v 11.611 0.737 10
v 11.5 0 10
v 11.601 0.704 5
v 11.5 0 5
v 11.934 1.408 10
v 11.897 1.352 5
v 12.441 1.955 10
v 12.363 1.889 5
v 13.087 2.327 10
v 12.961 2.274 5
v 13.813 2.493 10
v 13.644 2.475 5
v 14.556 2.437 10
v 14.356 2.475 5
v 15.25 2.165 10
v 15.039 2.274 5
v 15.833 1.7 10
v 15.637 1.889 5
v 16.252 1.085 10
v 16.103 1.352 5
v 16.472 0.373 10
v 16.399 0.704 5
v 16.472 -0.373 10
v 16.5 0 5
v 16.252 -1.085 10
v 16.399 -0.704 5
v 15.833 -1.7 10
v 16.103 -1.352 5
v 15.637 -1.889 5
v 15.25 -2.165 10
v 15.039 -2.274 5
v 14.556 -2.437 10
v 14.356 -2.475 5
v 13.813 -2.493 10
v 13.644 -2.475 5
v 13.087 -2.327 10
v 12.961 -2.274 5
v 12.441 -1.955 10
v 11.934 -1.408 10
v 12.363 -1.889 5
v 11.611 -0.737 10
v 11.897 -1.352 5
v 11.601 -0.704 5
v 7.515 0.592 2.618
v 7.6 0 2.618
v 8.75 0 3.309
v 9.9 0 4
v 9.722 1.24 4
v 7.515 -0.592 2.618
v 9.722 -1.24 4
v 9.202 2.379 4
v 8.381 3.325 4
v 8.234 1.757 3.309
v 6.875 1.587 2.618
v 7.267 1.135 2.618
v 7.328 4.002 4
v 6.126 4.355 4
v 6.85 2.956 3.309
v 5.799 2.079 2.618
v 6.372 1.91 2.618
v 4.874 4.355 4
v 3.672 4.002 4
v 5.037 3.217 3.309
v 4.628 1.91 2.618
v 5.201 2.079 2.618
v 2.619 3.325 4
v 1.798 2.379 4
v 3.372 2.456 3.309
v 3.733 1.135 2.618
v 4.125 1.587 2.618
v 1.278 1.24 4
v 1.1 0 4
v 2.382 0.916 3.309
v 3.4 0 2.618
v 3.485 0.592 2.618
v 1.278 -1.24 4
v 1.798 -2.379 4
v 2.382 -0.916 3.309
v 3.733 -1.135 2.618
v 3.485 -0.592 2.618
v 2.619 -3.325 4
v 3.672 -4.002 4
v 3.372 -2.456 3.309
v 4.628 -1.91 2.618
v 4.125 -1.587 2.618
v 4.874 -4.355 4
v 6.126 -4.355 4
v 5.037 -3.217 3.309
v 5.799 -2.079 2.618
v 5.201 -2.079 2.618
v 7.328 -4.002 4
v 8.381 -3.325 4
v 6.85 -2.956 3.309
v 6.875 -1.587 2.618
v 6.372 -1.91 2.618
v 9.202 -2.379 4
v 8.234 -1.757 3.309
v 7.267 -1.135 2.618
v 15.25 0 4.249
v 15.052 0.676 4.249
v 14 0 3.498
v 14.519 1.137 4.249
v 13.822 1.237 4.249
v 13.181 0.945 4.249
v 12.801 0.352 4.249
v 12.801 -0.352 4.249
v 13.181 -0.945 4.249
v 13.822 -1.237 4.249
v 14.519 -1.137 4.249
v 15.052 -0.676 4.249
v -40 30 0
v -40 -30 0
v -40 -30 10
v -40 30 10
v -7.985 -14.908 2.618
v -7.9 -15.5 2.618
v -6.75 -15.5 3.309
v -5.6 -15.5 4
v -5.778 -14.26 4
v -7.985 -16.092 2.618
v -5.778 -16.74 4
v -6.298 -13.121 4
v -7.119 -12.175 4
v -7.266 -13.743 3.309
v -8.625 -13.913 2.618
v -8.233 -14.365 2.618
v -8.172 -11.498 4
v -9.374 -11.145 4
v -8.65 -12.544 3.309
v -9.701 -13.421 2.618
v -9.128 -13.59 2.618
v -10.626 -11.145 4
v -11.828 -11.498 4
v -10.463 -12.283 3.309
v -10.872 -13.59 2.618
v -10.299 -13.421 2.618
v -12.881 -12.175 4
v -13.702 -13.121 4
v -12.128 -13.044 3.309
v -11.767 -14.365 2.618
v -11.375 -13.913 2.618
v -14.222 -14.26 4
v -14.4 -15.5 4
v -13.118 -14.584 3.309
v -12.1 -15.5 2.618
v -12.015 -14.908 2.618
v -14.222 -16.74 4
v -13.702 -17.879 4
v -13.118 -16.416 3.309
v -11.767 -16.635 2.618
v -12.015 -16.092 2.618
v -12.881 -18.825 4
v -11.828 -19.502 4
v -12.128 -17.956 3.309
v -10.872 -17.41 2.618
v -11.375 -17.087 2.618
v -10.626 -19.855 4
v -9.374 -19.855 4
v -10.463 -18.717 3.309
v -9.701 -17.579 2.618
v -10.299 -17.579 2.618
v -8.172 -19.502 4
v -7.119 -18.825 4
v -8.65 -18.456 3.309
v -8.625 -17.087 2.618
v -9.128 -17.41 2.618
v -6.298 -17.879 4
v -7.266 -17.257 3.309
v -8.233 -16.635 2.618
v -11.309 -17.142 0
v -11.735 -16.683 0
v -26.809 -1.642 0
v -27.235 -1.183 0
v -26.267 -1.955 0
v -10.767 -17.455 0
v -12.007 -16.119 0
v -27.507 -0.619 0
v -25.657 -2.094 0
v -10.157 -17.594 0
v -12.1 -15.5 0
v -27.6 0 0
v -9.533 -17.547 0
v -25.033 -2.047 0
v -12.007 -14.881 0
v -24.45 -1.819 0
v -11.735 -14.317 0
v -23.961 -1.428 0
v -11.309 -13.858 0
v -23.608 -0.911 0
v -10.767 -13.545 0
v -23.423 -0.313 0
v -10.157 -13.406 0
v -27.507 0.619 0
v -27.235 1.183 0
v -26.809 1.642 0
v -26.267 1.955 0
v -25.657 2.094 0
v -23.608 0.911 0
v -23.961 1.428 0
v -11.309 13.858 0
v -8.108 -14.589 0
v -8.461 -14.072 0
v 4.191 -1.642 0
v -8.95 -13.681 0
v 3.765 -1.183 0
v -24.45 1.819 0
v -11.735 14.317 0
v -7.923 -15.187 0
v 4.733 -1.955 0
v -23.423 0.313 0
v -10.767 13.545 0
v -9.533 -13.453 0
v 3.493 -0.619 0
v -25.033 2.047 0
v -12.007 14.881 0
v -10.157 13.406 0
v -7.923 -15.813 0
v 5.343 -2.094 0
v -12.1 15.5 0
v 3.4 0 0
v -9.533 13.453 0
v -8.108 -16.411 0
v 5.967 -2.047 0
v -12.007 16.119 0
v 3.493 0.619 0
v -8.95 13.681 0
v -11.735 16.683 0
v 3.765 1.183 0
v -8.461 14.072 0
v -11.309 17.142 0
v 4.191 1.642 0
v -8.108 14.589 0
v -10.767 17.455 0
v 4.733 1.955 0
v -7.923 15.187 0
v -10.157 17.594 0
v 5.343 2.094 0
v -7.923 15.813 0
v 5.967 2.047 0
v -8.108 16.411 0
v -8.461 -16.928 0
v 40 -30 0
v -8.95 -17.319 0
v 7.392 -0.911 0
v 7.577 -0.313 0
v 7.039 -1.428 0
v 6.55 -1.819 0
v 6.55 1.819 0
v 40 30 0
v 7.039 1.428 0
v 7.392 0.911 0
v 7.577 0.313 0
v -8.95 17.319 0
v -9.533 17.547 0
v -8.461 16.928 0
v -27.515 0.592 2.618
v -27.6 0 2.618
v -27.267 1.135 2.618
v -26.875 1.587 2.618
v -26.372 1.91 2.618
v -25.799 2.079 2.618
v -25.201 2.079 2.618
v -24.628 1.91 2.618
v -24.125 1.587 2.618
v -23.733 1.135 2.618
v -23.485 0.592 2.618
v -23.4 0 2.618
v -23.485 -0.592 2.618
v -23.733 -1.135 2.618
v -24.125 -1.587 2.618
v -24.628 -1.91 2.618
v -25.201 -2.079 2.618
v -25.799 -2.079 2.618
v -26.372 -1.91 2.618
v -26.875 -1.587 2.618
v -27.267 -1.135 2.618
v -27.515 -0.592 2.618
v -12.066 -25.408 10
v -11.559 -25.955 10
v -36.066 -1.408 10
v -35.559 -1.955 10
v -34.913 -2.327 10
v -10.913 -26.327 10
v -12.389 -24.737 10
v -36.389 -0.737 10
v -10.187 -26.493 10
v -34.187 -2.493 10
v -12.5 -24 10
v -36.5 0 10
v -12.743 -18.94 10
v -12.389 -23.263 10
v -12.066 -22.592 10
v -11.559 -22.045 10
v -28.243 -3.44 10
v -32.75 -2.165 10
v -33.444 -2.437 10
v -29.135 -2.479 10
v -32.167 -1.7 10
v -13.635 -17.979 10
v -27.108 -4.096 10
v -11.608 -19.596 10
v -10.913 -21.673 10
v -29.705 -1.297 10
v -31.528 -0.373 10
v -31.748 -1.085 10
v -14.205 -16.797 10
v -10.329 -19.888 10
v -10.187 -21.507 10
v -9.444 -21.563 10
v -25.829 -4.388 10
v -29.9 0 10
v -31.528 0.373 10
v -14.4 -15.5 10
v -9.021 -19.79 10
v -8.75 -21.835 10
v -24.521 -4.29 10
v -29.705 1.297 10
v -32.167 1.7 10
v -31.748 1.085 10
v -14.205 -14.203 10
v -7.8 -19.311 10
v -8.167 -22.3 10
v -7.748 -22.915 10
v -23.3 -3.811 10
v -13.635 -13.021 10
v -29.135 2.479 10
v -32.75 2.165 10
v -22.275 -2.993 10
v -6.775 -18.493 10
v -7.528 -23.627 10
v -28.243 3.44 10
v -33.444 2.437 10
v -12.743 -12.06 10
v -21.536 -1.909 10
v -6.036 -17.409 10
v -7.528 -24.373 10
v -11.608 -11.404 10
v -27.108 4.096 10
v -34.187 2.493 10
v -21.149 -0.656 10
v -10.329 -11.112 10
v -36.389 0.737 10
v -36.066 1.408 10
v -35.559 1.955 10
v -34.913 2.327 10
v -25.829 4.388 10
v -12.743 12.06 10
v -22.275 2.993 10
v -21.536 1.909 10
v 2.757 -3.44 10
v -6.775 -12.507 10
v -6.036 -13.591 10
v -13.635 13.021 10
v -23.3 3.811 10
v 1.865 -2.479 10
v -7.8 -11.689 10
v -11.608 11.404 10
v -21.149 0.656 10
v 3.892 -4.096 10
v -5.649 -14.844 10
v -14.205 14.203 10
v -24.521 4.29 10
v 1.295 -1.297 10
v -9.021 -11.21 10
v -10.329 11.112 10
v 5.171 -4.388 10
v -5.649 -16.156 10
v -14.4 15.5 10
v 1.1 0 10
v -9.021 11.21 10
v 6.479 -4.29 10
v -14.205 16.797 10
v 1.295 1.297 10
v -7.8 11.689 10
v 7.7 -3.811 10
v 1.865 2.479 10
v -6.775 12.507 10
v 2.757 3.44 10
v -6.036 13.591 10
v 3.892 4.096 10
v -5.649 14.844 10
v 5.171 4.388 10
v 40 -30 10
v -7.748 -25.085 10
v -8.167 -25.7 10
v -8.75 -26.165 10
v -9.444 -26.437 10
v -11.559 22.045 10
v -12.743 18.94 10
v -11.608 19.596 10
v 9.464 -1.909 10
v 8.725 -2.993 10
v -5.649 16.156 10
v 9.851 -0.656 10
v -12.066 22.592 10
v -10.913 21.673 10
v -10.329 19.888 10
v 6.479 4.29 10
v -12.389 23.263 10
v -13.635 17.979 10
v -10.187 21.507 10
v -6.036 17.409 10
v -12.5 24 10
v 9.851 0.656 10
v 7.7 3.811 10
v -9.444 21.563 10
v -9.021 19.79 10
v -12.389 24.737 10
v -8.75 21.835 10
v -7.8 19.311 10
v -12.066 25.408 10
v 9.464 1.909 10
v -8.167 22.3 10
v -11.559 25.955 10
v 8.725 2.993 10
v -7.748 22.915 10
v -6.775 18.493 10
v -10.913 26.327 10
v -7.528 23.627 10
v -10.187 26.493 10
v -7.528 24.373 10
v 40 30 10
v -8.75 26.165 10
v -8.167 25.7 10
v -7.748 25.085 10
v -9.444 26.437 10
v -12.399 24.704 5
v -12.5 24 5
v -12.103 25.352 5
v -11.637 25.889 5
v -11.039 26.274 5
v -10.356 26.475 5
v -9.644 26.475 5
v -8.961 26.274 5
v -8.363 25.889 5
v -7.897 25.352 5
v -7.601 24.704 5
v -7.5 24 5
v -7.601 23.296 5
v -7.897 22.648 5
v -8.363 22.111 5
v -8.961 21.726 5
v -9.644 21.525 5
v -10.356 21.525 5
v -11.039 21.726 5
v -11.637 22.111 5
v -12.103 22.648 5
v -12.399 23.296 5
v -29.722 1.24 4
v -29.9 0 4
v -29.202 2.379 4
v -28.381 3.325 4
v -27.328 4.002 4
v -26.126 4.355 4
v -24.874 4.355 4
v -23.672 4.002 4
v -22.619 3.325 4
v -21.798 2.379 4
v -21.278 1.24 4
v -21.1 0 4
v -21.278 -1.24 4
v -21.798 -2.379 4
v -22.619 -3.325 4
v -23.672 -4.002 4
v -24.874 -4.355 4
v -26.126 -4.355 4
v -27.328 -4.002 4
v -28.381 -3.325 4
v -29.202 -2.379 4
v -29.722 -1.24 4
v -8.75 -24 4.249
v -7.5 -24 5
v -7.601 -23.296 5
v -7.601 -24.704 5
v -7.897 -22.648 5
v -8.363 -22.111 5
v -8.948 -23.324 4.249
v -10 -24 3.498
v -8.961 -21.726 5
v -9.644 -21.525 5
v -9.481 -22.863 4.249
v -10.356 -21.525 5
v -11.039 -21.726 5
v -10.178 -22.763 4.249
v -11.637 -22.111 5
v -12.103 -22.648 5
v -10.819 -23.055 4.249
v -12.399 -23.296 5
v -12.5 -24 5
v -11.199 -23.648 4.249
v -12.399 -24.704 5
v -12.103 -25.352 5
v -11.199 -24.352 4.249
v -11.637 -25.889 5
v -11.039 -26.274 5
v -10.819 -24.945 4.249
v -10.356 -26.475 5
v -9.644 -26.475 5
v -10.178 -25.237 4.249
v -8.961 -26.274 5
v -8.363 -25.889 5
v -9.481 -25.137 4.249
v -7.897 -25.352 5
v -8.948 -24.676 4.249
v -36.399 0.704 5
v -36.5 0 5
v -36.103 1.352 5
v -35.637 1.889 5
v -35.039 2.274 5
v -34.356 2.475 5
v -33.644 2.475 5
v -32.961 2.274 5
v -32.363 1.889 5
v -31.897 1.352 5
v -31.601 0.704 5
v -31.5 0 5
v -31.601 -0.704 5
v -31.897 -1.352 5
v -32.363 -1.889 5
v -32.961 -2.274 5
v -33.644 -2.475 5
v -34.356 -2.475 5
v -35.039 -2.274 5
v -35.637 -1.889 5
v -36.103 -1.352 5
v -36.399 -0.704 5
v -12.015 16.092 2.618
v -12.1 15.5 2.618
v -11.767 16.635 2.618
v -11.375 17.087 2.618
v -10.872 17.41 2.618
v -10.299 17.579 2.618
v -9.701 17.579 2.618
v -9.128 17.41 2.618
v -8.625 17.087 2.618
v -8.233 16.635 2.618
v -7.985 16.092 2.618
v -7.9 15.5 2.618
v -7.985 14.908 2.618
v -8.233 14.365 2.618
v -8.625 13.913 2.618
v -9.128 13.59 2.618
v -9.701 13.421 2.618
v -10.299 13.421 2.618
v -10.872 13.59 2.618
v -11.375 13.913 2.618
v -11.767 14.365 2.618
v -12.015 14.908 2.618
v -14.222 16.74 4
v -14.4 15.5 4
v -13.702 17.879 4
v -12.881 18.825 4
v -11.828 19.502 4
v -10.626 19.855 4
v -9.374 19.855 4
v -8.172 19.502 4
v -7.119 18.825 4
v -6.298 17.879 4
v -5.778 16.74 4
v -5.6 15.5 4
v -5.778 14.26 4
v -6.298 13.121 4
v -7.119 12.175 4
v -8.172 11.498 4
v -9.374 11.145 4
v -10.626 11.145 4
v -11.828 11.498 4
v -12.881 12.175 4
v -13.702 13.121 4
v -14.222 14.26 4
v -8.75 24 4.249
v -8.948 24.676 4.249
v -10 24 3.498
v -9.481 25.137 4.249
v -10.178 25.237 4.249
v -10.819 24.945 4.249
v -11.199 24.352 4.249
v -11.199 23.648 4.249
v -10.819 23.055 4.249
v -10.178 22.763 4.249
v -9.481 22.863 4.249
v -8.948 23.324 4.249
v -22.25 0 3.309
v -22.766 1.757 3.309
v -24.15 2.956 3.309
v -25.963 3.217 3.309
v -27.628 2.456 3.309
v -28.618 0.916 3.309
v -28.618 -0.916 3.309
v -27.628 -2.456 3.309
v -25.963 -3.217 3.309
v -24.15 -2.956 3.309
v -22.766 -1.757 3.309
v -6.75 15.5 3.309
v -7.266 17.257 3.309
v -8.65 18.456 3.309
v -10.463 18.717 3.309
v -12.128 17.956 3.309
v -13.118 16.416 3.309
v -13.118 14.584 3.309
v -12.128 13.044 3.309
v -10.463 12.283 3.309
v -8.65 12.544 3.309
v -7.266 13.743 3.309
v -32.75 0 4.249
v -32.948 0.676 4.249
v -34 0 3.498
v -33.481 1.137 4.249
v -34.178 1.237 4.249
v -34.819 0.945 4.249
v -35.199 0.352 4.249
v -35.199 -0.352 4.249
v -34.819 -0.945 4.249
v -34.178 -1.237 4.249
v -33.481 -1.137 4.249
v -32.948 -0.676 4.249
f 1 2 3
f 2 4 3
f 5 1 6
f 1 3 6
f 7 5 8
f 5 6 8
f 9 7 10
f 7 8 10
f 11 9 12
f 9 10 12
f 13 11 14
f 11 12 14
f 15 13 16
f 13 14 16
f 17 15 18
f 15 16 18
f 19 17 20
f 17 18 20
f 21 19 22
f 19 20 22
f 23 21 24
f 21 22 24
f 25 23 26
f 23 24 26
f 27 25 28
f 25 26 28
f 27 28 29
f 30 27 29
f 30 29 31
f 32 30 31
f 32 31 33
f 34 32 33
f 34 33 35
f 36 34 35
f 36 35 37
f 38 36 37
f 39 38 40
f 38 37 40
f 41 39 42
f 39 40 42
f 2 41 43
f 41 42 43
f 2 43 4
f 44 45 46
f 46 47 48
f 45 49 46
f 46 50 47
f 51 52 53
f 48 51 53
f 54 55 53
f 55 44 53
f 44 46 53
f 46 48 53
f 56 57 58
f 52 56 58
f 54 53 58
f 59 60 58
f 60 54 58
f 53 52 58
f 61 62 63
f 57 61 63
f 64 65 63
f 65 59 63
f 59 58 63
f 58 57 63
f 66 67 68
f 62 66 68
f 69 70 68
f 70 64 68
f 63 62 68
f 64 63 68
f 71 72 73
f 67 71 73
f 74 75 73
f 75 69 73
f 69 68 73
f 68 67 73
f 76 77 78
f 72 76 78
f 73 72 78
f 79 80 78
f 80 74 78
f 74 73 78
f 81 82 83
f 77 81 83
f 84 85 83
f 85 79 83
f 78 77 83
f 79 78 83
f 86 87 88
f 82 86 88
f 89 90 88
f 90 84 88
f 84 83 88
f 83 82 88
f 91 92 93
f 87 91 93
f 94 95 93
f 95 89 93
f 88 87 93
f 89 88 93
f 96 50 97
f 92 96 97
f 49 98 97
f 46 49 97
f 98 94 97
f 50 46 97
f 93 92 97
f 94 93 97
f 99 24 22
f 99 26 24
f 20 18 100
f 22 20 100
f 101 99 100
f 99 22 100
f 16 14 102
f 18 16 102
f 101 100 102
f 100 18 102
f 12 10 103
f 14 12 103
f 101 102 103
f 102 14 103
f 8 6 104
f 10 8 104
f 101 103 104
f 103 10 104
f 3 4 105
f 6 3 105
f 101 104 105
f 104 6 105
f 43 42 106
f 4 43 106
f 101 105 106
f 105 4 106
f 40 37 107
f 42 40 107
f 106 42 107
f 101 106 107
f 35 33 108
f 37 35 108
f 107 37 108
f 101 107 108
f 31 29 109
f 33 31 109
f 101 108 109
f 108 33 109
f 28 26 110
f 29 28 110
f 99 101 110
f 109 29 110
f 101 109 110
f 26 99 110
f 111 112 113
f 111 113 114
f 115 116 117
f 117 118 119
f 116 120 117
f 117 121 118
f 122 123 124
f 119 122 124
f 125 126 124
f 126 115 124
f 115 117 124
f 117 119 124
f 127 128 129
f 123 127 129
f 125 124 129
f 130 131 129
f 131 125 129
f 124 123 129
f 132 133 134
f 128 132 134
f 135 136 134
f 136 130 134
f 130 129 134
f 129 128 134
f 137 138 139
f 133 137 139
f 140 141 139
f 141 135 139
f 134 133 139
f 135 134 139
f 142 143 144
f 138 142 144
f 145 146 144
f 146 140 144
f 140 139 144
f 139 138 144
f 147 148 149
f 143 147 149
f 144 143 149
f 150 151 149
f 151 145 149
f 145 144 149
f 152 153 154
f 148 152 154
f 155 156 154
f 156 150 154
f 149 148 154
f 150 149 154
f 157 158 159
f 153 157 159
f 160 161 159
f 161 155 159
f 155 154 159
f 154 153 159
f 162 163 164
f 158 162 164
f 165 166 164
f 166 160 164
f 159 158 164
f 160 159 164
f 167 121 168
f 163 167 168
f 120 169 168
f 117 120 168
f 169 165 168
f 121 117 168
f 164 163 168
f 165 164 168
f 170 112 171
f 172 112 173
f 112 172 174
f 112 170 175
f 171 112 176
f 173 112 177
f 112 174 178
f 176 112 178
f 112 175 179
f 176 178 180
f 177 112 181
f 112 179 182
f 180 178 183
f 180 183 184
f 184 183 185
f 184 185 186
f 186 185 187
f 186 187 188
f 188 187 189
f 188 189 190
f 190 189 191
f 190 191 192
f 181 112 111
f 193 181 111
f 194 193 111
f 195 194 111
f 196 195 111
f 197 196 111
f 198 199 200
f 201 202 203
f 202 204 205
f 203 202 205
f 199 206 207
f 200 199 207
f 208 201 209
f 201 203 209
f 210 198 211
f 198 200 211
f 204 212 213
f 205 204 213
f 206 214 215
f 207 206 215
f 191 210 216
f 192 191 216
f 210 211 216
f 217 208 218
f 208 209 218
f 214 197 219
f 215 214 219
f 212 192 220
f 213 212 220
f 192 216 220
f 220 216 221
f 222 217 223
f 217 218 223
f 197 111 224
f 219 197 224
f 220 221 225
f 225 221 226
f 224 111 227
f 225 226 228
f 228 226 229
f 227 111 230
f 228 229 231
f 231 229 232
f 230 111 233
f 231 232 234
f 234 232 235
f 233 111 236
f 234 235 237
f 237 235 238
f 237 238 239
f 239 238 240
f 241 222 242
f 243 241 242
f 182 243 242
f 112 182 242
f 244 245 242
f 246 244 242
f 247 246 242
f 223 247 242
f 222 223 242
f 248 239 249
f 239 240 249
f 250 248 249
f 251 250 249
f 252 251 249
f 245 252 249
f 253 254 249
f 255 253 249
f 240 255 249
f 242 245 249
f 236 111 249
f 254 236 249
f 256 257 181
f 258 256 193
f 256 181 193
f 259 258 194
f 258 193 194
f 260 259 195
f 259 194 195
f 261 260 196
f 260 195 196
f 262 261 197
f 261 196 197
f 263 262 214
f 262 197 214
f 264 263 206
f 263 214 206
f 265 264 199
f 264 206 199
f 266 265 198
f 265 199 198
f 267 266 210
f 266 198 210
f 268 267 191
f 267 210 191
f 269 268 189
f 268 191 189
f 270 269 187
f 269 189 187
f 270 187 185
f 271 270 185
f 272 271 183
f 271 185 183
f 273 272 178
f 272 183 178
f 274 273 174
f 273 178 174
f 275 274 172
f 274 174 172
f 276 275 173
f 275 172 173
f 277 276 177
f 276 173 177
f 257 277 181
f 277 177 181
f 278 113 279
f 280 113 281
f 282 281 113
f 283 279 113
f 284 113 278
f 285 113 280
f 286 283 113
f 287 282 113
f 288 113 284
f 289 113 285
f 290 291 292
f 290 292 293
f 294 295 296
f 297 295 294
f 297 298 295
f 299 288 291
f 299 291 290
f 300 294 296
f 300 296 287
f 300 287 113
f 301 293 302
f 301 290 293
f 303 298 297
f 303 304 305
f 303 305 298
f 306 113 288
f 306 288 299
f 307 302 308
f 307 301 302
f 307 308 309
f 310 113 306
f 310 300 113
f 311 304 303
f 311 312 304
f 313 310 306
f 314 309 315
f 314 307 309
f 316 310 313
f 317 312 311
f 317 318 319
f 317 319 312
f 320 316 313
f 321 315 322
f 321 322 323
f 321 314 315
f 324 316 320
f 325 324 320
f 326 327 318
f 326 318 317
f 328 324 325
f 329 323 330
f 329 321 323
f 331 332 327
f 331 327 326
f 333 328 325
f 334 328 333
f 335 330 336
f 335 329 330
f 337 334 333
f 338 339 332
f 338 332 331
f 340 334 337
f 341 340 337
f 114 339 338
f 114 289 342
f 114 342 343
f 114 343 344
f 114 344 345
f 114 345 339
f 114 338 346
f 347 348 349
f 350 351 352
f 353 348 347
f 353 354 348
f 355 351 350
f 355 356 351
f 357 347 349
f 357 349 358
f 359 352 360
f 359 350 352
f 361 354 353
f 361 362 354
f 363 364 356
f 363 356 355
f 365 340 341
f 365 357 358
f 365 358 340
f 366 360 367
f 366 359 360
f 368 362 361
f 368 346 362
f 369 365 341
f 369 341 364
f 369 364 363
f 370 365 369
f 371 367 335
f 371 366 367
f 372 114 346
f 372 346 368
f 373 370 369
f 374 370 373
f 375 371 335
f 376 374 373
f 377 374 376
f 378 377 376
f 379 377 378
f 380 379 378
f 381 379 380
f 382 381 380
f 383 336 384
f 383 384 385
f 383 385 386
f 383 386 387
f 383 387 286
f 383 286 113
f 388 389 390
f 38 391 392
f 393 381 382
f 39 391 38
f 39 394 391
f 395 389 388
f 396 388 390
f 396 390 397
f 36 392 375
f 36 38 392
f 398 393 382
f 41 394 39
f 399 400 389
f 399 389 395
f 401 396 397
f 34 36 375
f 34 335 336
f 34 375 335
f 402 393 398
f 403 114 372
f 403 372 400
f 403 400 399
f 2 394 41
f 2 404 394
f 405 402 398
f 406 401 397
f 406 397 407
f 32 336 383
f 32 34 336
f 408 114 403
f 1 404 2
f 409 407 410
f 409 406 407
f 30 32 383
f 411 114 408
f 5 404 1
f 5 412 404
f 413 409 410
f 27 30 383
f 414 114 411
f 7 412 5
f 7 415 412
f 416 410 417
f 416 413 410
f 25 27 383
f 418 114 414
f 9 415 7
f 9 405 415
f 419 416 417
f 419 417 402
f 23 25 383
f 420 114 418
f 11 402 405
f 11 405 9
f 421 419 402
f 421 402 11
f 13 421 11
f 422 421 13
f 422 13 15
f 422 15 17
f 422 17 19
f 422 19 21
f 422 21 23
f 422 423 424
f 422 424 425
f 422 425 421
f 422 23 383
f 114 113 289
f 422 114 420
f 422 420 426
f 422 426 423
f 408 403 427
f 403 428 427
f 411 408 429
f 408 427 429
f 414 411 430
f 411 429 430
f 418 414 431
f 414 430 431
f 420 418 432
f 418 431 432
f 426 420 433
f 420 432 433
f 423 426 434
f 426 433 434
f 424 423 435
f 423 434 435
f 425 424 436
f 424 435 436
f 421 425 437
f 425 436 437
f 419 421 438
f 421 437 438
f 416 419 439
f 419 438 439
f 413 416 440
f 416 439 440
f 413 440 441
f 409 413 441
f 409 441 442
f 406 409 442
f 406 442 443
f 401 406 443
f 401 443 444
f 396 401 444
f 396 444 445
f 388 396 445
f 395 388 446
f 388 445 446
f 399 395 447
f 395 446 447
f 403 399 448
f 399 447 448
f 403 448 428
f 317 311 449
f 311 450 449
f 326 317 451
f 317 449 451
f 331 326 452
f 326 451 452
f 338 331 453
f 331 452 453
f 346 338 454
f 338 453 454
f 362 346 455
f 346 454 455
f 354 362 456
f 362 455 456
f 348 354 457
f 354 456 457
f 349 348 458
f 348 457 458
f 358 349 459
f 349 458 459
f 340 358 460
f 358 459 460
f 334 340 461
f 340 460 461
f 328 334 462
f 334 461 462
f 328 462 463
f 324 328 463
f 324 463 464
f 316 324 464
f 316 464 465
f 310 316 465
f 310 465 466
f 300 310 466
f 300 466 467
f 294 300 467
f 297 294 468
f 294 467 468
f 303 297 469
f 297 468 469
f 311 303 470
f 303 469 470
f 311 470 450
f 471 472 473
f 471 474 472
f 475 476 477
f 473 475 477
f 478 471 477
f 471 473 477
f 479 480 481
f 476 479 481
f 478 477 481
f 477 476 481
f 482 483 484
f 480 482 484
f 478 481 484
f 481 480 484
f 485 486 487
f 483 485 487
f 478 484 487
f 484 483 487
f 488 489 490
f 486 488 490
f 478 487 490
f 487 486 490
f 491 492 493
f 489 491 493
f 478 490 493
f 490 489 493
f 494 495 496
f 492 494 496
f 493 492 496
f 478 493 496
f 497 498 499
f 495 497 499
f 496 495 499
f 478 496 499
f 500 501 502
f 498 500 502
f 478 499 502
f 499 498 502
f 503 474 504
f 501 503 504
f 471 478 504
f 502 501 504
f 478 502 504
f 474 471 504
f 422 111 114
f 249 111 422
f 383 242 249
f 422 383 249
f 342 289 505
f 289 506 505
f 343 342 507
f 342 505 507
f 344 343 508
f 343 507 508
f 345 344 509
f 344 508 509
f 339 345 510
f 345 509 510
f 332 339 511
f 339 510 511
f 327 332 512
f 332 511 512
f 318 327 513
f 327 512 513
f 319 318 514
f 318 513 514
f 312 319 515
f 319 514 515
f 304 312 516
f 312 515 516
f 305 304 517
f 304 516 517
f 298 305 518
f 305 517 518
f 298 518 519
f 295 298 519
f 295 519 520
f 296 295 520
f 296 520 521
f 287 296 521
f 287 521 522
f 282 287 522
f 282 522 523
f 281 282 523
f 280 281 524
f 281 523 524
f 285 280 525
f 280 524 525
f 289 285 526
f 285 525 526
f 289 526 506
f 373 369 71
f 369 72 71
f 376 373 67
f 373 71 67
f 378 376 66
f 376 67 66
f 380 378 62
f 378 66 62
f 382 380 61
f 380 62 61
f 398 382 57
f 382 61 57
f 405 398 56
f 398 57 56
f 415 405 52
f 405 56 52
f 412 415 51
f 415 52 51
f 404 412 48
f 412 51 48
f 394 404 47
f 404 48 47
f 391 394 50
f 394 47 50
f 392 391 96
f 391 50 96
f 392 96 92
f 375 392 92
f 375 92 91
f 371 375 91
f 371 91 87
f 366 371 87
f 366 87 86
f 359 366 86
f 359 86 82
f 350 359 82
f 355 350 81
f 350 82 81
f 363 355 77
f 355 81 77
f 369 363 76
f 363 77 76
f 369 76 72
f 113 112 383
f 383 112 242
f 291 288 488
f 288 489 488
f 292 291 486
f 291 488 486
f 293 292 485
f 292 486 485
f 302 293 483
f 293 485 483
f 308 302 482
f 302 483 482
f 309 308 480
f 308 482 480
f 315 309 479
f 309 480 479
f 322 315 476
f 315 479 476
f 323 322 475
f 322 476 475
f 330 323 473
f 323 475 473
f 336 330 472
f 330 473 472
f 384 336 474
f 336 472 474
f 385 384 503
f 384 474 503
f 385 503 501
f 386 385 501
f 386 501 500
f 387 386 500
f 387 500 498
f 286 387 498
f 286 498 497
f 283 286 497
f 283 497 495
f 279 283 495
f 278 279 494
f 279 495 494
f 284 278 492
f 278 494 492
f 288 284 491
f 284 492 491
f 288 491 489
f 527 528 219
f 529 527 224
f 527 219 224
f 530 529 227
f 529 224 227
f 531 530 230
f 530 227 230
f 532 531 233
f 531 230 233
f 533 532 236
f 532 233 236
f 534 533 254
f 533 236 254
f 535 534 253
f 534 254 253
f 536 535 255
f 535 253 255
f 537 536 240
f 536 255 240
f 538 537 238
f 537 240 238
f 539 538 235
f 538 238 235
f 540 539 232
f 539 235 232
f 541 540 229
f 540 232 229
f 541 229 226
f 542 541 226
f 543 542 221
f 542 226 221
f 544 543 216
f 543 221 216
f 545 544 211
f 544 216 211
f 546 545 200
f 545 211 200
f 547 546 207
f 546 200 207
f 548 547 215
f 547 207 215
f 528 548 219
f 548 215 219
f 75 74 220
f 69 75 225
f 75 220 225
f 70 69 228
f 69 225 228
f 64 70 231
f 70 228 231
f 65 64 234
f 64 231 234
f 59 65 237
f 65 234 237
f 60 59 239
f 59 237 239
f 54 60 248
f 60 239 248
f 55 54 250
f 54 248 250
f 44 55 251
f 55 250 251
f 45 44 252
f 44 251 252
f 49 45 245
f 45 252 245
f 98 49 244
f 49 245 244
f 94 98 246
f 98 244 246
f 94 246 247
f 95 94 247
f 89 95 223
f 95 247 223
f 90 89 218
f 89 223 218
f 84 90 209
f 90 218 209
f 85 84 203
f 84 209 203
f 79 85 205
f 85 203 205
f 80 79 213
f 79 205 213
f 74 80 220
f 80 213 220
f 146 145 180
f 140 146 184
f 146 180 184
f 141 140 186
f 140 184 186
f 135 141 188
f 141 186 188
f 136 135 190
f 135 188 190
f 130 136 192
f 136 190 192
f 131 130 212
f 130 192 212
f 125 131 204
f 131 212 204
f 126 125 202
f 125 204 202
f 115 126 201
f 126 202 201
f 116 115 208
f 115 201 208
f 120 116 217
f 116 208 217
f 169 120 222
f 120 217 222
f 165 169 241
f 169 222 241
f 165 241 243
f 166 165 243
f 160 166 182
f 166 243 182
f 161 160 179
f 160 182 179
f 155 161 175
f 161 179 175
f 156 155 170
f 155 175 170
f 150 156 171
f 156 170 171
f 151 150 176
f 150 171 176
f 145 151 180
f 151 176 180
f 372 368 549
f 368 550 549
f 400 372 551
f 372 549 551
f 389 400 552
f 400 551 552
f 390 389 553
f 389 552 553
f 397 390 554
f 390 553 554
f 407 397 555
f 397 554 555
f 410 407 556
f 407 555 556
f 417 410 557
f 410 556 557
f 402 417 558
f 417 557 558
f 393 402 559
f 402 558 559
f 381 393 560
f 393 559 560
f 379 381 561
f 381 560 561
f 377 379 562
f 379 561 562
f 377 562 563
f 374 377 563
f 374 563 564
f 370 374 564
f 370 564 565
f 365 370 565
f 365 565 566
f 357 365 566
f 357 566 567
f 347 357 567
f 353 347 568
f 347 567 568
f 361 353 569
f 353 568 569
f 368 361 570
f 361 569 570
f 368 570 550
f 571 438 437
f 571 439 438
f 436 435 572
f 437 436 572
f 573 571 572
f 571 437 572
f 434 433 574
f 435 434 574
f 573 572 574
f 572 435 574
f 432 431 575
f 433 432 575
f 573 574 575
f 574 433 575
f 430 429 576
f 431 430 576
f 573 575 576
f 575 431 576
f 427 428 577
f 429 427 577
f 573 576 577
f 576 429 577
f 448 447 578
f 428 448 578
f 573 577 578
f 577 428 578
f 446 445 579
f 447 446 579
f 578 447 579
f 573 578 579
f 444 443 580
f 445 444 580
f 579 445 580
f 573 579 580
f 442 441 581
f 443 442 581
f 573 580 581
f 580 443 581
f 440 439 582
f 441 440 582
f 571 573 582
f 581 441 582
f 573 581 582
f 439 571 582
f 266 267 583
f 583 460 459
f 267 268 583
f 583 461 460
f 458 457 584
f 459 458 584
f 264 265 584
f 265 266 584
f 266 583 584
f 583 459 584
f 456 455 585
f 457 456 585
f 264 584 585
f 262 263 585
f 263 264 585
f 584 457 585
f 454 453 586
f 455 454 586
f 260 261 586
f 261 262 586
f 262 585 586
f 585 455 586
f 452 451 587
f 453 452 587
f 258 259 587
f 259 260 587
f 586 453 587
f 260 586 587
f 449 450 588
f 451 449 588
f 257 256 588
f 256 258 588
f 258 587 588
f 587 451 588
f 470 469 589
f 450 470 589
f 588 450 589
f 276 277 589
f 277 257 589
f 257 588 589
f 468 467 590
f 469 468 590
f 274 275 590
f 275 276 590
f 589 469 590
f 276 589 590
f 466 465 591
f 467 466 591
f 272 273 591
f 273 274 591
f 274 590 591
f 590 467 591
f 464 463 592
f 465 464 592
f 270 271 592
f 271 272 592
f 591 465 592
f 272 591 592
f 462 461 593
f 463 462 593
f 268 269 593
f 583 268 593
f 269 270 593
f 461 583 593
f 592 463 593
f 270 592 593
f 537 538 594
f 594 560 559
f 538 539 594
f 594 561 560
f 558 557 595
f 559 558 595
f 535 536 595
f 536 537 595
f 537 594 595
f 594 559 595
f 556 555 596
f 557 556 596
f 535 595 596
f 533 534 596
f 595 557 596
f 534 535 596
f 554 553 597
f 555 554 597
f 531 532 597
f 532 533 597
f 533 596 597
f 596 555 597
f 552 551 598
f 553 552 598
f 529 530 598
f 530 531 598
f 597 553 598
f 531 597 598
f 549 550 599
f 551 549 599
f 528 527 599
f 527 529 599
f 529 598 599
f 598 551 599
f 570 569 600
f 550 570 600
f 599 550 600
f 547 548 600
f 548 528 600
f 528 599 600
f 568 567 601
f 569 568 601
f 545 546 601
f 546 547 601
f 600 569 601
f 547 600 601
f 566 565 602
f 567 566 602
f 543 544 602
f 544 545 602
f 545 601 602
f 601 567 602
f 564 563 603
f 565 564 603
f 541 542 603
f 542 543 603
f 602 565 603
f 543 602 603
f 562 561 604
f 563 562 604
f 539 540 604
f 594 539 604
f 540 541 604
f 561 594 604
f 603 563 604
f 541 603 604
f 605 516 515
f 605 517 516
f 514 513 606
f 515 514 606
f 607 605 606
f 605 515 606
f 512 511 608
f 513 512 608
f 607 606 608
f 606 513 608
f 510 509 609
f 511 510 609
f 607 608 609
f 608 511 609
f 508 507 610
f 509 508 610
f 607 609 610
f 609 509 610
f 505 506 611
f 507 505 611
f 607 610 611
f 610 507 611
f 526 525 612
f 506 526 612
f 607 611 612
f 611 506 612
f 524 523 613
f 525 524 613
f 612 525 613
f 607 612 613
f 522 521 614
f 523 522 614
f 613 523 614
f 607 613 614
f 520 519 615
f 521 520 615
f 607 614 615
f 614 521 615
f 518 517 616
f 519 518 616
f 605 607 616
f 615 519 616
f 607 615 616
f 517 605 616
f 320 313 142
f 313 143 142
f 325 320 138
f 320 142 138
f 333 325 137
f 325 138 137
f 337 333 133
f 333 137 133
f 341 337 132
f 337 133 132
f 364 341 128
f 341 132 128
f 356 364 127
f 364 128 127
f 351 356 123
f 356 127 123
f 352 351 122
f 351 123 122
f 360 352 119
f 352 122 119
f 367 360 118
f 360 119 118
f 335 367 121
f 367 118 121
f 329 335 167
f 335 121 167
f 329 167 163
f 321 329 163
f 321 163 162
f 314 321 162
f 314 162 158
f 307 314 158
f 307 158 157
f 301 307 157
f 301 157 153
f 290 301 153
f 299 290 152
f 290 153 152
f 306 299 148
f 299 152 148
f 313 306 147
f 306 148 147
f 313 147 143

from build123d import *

# Parameters (mm, degrees)
SKETCH_1_W                  = 80
SKETCH_1_H                  = 60
EXTRUDE_1_DEPTH             = 10
HOLE_WIZARD_M5_1_D          = 4.2
HOLE_WIZARD_8_8_8_8_1_D     = 8.8
HOLE_WIZARD_8_8_8_8_1_DEPTH = 6
HOLE_WIZARD_8_8_8_8_1_TIP   = 2.643786724
HOLE_WIZARD_M6_1_D          = 5
HOLE_WIZARD_M6_1_DEPTH      = 5
HOLE_WIZARD_M6_1_TIP        = 1.502151548


with BuildPart() as part:
    # 스케치1 → 보스-돌출1 (new body)
    with BuildSketch(Plane.XY):
        Rectangle(SKETCH_1_W, SKETCH_1_H)
    extrude(amount=EXTRUDE_1_DEPTH)

    # M5 탭을 위한 탭 드릴1 (through all)
    with Locations(Plane(origin=(-25.5, 0, 10), x_dir=(1, 0, 0), z_dir=(0, 0, 1))):
        with Locations((0, 0), (15.5, -15.5), (31, 0), (15.5, 15.5)):
            Hole(HOLE_WIZARD_M5_1_D / 2)

    # Ø8.8 (8.8) 지름 구멍1
    with Locations(Plane(origin=(-25.5, 0, 10), x_dir=(1, 0, 0), z_dir=(0, 0, 1))):
        with Locations((0, 0), (15.5, 15.5), (31, 0), (15.5, -15.5)):
            Hole(HOLE_WIZARD_8_8_8_8_1_D / 2, depth=HOLE_WIZARD_8_8_8_8_1_DEPTH)
            with Locations((0, 0, -(HOLE_WIZARD_8_8_8_8_1_DEPTH + HOLE_WIZARD_8_8_8_8_1_TIP / 2))):  # 118° drill point
                Cone(0, HOLE_WIZARD_8_8_8_8_1_D / 2, HOLE_WIZARD_8_8_8_8_1_TIP, mode=Mode.SUBTRACT)

    # M6 탭을 위한 탭 드릴1
    with Locations(Plane(origin=(-10, 24, 10), x_dir=(1, 0, 0), z_dir=(0, 0, 1))):
        with Locations((0, 0), (-24, -24), (0, -48), (24, -24)):
            Hole(HOLE_WIZARD_M6_1_D / 2, depth=HOLE_WIZARD_M6_1_DEPTH)
            with Locations((0, 0, -(HOLE_WIZARD_M6_1_DEPTH + HOLE_WIZARD_M6_1_TIP / 2))):  # 118° drill point
                Cone(0, HOLE_WIZARD_M6_1_D / 2, HOLE_WIZARD_M6_1_TIP, mode=Mode.SUBTRACT)


solid = part.part
